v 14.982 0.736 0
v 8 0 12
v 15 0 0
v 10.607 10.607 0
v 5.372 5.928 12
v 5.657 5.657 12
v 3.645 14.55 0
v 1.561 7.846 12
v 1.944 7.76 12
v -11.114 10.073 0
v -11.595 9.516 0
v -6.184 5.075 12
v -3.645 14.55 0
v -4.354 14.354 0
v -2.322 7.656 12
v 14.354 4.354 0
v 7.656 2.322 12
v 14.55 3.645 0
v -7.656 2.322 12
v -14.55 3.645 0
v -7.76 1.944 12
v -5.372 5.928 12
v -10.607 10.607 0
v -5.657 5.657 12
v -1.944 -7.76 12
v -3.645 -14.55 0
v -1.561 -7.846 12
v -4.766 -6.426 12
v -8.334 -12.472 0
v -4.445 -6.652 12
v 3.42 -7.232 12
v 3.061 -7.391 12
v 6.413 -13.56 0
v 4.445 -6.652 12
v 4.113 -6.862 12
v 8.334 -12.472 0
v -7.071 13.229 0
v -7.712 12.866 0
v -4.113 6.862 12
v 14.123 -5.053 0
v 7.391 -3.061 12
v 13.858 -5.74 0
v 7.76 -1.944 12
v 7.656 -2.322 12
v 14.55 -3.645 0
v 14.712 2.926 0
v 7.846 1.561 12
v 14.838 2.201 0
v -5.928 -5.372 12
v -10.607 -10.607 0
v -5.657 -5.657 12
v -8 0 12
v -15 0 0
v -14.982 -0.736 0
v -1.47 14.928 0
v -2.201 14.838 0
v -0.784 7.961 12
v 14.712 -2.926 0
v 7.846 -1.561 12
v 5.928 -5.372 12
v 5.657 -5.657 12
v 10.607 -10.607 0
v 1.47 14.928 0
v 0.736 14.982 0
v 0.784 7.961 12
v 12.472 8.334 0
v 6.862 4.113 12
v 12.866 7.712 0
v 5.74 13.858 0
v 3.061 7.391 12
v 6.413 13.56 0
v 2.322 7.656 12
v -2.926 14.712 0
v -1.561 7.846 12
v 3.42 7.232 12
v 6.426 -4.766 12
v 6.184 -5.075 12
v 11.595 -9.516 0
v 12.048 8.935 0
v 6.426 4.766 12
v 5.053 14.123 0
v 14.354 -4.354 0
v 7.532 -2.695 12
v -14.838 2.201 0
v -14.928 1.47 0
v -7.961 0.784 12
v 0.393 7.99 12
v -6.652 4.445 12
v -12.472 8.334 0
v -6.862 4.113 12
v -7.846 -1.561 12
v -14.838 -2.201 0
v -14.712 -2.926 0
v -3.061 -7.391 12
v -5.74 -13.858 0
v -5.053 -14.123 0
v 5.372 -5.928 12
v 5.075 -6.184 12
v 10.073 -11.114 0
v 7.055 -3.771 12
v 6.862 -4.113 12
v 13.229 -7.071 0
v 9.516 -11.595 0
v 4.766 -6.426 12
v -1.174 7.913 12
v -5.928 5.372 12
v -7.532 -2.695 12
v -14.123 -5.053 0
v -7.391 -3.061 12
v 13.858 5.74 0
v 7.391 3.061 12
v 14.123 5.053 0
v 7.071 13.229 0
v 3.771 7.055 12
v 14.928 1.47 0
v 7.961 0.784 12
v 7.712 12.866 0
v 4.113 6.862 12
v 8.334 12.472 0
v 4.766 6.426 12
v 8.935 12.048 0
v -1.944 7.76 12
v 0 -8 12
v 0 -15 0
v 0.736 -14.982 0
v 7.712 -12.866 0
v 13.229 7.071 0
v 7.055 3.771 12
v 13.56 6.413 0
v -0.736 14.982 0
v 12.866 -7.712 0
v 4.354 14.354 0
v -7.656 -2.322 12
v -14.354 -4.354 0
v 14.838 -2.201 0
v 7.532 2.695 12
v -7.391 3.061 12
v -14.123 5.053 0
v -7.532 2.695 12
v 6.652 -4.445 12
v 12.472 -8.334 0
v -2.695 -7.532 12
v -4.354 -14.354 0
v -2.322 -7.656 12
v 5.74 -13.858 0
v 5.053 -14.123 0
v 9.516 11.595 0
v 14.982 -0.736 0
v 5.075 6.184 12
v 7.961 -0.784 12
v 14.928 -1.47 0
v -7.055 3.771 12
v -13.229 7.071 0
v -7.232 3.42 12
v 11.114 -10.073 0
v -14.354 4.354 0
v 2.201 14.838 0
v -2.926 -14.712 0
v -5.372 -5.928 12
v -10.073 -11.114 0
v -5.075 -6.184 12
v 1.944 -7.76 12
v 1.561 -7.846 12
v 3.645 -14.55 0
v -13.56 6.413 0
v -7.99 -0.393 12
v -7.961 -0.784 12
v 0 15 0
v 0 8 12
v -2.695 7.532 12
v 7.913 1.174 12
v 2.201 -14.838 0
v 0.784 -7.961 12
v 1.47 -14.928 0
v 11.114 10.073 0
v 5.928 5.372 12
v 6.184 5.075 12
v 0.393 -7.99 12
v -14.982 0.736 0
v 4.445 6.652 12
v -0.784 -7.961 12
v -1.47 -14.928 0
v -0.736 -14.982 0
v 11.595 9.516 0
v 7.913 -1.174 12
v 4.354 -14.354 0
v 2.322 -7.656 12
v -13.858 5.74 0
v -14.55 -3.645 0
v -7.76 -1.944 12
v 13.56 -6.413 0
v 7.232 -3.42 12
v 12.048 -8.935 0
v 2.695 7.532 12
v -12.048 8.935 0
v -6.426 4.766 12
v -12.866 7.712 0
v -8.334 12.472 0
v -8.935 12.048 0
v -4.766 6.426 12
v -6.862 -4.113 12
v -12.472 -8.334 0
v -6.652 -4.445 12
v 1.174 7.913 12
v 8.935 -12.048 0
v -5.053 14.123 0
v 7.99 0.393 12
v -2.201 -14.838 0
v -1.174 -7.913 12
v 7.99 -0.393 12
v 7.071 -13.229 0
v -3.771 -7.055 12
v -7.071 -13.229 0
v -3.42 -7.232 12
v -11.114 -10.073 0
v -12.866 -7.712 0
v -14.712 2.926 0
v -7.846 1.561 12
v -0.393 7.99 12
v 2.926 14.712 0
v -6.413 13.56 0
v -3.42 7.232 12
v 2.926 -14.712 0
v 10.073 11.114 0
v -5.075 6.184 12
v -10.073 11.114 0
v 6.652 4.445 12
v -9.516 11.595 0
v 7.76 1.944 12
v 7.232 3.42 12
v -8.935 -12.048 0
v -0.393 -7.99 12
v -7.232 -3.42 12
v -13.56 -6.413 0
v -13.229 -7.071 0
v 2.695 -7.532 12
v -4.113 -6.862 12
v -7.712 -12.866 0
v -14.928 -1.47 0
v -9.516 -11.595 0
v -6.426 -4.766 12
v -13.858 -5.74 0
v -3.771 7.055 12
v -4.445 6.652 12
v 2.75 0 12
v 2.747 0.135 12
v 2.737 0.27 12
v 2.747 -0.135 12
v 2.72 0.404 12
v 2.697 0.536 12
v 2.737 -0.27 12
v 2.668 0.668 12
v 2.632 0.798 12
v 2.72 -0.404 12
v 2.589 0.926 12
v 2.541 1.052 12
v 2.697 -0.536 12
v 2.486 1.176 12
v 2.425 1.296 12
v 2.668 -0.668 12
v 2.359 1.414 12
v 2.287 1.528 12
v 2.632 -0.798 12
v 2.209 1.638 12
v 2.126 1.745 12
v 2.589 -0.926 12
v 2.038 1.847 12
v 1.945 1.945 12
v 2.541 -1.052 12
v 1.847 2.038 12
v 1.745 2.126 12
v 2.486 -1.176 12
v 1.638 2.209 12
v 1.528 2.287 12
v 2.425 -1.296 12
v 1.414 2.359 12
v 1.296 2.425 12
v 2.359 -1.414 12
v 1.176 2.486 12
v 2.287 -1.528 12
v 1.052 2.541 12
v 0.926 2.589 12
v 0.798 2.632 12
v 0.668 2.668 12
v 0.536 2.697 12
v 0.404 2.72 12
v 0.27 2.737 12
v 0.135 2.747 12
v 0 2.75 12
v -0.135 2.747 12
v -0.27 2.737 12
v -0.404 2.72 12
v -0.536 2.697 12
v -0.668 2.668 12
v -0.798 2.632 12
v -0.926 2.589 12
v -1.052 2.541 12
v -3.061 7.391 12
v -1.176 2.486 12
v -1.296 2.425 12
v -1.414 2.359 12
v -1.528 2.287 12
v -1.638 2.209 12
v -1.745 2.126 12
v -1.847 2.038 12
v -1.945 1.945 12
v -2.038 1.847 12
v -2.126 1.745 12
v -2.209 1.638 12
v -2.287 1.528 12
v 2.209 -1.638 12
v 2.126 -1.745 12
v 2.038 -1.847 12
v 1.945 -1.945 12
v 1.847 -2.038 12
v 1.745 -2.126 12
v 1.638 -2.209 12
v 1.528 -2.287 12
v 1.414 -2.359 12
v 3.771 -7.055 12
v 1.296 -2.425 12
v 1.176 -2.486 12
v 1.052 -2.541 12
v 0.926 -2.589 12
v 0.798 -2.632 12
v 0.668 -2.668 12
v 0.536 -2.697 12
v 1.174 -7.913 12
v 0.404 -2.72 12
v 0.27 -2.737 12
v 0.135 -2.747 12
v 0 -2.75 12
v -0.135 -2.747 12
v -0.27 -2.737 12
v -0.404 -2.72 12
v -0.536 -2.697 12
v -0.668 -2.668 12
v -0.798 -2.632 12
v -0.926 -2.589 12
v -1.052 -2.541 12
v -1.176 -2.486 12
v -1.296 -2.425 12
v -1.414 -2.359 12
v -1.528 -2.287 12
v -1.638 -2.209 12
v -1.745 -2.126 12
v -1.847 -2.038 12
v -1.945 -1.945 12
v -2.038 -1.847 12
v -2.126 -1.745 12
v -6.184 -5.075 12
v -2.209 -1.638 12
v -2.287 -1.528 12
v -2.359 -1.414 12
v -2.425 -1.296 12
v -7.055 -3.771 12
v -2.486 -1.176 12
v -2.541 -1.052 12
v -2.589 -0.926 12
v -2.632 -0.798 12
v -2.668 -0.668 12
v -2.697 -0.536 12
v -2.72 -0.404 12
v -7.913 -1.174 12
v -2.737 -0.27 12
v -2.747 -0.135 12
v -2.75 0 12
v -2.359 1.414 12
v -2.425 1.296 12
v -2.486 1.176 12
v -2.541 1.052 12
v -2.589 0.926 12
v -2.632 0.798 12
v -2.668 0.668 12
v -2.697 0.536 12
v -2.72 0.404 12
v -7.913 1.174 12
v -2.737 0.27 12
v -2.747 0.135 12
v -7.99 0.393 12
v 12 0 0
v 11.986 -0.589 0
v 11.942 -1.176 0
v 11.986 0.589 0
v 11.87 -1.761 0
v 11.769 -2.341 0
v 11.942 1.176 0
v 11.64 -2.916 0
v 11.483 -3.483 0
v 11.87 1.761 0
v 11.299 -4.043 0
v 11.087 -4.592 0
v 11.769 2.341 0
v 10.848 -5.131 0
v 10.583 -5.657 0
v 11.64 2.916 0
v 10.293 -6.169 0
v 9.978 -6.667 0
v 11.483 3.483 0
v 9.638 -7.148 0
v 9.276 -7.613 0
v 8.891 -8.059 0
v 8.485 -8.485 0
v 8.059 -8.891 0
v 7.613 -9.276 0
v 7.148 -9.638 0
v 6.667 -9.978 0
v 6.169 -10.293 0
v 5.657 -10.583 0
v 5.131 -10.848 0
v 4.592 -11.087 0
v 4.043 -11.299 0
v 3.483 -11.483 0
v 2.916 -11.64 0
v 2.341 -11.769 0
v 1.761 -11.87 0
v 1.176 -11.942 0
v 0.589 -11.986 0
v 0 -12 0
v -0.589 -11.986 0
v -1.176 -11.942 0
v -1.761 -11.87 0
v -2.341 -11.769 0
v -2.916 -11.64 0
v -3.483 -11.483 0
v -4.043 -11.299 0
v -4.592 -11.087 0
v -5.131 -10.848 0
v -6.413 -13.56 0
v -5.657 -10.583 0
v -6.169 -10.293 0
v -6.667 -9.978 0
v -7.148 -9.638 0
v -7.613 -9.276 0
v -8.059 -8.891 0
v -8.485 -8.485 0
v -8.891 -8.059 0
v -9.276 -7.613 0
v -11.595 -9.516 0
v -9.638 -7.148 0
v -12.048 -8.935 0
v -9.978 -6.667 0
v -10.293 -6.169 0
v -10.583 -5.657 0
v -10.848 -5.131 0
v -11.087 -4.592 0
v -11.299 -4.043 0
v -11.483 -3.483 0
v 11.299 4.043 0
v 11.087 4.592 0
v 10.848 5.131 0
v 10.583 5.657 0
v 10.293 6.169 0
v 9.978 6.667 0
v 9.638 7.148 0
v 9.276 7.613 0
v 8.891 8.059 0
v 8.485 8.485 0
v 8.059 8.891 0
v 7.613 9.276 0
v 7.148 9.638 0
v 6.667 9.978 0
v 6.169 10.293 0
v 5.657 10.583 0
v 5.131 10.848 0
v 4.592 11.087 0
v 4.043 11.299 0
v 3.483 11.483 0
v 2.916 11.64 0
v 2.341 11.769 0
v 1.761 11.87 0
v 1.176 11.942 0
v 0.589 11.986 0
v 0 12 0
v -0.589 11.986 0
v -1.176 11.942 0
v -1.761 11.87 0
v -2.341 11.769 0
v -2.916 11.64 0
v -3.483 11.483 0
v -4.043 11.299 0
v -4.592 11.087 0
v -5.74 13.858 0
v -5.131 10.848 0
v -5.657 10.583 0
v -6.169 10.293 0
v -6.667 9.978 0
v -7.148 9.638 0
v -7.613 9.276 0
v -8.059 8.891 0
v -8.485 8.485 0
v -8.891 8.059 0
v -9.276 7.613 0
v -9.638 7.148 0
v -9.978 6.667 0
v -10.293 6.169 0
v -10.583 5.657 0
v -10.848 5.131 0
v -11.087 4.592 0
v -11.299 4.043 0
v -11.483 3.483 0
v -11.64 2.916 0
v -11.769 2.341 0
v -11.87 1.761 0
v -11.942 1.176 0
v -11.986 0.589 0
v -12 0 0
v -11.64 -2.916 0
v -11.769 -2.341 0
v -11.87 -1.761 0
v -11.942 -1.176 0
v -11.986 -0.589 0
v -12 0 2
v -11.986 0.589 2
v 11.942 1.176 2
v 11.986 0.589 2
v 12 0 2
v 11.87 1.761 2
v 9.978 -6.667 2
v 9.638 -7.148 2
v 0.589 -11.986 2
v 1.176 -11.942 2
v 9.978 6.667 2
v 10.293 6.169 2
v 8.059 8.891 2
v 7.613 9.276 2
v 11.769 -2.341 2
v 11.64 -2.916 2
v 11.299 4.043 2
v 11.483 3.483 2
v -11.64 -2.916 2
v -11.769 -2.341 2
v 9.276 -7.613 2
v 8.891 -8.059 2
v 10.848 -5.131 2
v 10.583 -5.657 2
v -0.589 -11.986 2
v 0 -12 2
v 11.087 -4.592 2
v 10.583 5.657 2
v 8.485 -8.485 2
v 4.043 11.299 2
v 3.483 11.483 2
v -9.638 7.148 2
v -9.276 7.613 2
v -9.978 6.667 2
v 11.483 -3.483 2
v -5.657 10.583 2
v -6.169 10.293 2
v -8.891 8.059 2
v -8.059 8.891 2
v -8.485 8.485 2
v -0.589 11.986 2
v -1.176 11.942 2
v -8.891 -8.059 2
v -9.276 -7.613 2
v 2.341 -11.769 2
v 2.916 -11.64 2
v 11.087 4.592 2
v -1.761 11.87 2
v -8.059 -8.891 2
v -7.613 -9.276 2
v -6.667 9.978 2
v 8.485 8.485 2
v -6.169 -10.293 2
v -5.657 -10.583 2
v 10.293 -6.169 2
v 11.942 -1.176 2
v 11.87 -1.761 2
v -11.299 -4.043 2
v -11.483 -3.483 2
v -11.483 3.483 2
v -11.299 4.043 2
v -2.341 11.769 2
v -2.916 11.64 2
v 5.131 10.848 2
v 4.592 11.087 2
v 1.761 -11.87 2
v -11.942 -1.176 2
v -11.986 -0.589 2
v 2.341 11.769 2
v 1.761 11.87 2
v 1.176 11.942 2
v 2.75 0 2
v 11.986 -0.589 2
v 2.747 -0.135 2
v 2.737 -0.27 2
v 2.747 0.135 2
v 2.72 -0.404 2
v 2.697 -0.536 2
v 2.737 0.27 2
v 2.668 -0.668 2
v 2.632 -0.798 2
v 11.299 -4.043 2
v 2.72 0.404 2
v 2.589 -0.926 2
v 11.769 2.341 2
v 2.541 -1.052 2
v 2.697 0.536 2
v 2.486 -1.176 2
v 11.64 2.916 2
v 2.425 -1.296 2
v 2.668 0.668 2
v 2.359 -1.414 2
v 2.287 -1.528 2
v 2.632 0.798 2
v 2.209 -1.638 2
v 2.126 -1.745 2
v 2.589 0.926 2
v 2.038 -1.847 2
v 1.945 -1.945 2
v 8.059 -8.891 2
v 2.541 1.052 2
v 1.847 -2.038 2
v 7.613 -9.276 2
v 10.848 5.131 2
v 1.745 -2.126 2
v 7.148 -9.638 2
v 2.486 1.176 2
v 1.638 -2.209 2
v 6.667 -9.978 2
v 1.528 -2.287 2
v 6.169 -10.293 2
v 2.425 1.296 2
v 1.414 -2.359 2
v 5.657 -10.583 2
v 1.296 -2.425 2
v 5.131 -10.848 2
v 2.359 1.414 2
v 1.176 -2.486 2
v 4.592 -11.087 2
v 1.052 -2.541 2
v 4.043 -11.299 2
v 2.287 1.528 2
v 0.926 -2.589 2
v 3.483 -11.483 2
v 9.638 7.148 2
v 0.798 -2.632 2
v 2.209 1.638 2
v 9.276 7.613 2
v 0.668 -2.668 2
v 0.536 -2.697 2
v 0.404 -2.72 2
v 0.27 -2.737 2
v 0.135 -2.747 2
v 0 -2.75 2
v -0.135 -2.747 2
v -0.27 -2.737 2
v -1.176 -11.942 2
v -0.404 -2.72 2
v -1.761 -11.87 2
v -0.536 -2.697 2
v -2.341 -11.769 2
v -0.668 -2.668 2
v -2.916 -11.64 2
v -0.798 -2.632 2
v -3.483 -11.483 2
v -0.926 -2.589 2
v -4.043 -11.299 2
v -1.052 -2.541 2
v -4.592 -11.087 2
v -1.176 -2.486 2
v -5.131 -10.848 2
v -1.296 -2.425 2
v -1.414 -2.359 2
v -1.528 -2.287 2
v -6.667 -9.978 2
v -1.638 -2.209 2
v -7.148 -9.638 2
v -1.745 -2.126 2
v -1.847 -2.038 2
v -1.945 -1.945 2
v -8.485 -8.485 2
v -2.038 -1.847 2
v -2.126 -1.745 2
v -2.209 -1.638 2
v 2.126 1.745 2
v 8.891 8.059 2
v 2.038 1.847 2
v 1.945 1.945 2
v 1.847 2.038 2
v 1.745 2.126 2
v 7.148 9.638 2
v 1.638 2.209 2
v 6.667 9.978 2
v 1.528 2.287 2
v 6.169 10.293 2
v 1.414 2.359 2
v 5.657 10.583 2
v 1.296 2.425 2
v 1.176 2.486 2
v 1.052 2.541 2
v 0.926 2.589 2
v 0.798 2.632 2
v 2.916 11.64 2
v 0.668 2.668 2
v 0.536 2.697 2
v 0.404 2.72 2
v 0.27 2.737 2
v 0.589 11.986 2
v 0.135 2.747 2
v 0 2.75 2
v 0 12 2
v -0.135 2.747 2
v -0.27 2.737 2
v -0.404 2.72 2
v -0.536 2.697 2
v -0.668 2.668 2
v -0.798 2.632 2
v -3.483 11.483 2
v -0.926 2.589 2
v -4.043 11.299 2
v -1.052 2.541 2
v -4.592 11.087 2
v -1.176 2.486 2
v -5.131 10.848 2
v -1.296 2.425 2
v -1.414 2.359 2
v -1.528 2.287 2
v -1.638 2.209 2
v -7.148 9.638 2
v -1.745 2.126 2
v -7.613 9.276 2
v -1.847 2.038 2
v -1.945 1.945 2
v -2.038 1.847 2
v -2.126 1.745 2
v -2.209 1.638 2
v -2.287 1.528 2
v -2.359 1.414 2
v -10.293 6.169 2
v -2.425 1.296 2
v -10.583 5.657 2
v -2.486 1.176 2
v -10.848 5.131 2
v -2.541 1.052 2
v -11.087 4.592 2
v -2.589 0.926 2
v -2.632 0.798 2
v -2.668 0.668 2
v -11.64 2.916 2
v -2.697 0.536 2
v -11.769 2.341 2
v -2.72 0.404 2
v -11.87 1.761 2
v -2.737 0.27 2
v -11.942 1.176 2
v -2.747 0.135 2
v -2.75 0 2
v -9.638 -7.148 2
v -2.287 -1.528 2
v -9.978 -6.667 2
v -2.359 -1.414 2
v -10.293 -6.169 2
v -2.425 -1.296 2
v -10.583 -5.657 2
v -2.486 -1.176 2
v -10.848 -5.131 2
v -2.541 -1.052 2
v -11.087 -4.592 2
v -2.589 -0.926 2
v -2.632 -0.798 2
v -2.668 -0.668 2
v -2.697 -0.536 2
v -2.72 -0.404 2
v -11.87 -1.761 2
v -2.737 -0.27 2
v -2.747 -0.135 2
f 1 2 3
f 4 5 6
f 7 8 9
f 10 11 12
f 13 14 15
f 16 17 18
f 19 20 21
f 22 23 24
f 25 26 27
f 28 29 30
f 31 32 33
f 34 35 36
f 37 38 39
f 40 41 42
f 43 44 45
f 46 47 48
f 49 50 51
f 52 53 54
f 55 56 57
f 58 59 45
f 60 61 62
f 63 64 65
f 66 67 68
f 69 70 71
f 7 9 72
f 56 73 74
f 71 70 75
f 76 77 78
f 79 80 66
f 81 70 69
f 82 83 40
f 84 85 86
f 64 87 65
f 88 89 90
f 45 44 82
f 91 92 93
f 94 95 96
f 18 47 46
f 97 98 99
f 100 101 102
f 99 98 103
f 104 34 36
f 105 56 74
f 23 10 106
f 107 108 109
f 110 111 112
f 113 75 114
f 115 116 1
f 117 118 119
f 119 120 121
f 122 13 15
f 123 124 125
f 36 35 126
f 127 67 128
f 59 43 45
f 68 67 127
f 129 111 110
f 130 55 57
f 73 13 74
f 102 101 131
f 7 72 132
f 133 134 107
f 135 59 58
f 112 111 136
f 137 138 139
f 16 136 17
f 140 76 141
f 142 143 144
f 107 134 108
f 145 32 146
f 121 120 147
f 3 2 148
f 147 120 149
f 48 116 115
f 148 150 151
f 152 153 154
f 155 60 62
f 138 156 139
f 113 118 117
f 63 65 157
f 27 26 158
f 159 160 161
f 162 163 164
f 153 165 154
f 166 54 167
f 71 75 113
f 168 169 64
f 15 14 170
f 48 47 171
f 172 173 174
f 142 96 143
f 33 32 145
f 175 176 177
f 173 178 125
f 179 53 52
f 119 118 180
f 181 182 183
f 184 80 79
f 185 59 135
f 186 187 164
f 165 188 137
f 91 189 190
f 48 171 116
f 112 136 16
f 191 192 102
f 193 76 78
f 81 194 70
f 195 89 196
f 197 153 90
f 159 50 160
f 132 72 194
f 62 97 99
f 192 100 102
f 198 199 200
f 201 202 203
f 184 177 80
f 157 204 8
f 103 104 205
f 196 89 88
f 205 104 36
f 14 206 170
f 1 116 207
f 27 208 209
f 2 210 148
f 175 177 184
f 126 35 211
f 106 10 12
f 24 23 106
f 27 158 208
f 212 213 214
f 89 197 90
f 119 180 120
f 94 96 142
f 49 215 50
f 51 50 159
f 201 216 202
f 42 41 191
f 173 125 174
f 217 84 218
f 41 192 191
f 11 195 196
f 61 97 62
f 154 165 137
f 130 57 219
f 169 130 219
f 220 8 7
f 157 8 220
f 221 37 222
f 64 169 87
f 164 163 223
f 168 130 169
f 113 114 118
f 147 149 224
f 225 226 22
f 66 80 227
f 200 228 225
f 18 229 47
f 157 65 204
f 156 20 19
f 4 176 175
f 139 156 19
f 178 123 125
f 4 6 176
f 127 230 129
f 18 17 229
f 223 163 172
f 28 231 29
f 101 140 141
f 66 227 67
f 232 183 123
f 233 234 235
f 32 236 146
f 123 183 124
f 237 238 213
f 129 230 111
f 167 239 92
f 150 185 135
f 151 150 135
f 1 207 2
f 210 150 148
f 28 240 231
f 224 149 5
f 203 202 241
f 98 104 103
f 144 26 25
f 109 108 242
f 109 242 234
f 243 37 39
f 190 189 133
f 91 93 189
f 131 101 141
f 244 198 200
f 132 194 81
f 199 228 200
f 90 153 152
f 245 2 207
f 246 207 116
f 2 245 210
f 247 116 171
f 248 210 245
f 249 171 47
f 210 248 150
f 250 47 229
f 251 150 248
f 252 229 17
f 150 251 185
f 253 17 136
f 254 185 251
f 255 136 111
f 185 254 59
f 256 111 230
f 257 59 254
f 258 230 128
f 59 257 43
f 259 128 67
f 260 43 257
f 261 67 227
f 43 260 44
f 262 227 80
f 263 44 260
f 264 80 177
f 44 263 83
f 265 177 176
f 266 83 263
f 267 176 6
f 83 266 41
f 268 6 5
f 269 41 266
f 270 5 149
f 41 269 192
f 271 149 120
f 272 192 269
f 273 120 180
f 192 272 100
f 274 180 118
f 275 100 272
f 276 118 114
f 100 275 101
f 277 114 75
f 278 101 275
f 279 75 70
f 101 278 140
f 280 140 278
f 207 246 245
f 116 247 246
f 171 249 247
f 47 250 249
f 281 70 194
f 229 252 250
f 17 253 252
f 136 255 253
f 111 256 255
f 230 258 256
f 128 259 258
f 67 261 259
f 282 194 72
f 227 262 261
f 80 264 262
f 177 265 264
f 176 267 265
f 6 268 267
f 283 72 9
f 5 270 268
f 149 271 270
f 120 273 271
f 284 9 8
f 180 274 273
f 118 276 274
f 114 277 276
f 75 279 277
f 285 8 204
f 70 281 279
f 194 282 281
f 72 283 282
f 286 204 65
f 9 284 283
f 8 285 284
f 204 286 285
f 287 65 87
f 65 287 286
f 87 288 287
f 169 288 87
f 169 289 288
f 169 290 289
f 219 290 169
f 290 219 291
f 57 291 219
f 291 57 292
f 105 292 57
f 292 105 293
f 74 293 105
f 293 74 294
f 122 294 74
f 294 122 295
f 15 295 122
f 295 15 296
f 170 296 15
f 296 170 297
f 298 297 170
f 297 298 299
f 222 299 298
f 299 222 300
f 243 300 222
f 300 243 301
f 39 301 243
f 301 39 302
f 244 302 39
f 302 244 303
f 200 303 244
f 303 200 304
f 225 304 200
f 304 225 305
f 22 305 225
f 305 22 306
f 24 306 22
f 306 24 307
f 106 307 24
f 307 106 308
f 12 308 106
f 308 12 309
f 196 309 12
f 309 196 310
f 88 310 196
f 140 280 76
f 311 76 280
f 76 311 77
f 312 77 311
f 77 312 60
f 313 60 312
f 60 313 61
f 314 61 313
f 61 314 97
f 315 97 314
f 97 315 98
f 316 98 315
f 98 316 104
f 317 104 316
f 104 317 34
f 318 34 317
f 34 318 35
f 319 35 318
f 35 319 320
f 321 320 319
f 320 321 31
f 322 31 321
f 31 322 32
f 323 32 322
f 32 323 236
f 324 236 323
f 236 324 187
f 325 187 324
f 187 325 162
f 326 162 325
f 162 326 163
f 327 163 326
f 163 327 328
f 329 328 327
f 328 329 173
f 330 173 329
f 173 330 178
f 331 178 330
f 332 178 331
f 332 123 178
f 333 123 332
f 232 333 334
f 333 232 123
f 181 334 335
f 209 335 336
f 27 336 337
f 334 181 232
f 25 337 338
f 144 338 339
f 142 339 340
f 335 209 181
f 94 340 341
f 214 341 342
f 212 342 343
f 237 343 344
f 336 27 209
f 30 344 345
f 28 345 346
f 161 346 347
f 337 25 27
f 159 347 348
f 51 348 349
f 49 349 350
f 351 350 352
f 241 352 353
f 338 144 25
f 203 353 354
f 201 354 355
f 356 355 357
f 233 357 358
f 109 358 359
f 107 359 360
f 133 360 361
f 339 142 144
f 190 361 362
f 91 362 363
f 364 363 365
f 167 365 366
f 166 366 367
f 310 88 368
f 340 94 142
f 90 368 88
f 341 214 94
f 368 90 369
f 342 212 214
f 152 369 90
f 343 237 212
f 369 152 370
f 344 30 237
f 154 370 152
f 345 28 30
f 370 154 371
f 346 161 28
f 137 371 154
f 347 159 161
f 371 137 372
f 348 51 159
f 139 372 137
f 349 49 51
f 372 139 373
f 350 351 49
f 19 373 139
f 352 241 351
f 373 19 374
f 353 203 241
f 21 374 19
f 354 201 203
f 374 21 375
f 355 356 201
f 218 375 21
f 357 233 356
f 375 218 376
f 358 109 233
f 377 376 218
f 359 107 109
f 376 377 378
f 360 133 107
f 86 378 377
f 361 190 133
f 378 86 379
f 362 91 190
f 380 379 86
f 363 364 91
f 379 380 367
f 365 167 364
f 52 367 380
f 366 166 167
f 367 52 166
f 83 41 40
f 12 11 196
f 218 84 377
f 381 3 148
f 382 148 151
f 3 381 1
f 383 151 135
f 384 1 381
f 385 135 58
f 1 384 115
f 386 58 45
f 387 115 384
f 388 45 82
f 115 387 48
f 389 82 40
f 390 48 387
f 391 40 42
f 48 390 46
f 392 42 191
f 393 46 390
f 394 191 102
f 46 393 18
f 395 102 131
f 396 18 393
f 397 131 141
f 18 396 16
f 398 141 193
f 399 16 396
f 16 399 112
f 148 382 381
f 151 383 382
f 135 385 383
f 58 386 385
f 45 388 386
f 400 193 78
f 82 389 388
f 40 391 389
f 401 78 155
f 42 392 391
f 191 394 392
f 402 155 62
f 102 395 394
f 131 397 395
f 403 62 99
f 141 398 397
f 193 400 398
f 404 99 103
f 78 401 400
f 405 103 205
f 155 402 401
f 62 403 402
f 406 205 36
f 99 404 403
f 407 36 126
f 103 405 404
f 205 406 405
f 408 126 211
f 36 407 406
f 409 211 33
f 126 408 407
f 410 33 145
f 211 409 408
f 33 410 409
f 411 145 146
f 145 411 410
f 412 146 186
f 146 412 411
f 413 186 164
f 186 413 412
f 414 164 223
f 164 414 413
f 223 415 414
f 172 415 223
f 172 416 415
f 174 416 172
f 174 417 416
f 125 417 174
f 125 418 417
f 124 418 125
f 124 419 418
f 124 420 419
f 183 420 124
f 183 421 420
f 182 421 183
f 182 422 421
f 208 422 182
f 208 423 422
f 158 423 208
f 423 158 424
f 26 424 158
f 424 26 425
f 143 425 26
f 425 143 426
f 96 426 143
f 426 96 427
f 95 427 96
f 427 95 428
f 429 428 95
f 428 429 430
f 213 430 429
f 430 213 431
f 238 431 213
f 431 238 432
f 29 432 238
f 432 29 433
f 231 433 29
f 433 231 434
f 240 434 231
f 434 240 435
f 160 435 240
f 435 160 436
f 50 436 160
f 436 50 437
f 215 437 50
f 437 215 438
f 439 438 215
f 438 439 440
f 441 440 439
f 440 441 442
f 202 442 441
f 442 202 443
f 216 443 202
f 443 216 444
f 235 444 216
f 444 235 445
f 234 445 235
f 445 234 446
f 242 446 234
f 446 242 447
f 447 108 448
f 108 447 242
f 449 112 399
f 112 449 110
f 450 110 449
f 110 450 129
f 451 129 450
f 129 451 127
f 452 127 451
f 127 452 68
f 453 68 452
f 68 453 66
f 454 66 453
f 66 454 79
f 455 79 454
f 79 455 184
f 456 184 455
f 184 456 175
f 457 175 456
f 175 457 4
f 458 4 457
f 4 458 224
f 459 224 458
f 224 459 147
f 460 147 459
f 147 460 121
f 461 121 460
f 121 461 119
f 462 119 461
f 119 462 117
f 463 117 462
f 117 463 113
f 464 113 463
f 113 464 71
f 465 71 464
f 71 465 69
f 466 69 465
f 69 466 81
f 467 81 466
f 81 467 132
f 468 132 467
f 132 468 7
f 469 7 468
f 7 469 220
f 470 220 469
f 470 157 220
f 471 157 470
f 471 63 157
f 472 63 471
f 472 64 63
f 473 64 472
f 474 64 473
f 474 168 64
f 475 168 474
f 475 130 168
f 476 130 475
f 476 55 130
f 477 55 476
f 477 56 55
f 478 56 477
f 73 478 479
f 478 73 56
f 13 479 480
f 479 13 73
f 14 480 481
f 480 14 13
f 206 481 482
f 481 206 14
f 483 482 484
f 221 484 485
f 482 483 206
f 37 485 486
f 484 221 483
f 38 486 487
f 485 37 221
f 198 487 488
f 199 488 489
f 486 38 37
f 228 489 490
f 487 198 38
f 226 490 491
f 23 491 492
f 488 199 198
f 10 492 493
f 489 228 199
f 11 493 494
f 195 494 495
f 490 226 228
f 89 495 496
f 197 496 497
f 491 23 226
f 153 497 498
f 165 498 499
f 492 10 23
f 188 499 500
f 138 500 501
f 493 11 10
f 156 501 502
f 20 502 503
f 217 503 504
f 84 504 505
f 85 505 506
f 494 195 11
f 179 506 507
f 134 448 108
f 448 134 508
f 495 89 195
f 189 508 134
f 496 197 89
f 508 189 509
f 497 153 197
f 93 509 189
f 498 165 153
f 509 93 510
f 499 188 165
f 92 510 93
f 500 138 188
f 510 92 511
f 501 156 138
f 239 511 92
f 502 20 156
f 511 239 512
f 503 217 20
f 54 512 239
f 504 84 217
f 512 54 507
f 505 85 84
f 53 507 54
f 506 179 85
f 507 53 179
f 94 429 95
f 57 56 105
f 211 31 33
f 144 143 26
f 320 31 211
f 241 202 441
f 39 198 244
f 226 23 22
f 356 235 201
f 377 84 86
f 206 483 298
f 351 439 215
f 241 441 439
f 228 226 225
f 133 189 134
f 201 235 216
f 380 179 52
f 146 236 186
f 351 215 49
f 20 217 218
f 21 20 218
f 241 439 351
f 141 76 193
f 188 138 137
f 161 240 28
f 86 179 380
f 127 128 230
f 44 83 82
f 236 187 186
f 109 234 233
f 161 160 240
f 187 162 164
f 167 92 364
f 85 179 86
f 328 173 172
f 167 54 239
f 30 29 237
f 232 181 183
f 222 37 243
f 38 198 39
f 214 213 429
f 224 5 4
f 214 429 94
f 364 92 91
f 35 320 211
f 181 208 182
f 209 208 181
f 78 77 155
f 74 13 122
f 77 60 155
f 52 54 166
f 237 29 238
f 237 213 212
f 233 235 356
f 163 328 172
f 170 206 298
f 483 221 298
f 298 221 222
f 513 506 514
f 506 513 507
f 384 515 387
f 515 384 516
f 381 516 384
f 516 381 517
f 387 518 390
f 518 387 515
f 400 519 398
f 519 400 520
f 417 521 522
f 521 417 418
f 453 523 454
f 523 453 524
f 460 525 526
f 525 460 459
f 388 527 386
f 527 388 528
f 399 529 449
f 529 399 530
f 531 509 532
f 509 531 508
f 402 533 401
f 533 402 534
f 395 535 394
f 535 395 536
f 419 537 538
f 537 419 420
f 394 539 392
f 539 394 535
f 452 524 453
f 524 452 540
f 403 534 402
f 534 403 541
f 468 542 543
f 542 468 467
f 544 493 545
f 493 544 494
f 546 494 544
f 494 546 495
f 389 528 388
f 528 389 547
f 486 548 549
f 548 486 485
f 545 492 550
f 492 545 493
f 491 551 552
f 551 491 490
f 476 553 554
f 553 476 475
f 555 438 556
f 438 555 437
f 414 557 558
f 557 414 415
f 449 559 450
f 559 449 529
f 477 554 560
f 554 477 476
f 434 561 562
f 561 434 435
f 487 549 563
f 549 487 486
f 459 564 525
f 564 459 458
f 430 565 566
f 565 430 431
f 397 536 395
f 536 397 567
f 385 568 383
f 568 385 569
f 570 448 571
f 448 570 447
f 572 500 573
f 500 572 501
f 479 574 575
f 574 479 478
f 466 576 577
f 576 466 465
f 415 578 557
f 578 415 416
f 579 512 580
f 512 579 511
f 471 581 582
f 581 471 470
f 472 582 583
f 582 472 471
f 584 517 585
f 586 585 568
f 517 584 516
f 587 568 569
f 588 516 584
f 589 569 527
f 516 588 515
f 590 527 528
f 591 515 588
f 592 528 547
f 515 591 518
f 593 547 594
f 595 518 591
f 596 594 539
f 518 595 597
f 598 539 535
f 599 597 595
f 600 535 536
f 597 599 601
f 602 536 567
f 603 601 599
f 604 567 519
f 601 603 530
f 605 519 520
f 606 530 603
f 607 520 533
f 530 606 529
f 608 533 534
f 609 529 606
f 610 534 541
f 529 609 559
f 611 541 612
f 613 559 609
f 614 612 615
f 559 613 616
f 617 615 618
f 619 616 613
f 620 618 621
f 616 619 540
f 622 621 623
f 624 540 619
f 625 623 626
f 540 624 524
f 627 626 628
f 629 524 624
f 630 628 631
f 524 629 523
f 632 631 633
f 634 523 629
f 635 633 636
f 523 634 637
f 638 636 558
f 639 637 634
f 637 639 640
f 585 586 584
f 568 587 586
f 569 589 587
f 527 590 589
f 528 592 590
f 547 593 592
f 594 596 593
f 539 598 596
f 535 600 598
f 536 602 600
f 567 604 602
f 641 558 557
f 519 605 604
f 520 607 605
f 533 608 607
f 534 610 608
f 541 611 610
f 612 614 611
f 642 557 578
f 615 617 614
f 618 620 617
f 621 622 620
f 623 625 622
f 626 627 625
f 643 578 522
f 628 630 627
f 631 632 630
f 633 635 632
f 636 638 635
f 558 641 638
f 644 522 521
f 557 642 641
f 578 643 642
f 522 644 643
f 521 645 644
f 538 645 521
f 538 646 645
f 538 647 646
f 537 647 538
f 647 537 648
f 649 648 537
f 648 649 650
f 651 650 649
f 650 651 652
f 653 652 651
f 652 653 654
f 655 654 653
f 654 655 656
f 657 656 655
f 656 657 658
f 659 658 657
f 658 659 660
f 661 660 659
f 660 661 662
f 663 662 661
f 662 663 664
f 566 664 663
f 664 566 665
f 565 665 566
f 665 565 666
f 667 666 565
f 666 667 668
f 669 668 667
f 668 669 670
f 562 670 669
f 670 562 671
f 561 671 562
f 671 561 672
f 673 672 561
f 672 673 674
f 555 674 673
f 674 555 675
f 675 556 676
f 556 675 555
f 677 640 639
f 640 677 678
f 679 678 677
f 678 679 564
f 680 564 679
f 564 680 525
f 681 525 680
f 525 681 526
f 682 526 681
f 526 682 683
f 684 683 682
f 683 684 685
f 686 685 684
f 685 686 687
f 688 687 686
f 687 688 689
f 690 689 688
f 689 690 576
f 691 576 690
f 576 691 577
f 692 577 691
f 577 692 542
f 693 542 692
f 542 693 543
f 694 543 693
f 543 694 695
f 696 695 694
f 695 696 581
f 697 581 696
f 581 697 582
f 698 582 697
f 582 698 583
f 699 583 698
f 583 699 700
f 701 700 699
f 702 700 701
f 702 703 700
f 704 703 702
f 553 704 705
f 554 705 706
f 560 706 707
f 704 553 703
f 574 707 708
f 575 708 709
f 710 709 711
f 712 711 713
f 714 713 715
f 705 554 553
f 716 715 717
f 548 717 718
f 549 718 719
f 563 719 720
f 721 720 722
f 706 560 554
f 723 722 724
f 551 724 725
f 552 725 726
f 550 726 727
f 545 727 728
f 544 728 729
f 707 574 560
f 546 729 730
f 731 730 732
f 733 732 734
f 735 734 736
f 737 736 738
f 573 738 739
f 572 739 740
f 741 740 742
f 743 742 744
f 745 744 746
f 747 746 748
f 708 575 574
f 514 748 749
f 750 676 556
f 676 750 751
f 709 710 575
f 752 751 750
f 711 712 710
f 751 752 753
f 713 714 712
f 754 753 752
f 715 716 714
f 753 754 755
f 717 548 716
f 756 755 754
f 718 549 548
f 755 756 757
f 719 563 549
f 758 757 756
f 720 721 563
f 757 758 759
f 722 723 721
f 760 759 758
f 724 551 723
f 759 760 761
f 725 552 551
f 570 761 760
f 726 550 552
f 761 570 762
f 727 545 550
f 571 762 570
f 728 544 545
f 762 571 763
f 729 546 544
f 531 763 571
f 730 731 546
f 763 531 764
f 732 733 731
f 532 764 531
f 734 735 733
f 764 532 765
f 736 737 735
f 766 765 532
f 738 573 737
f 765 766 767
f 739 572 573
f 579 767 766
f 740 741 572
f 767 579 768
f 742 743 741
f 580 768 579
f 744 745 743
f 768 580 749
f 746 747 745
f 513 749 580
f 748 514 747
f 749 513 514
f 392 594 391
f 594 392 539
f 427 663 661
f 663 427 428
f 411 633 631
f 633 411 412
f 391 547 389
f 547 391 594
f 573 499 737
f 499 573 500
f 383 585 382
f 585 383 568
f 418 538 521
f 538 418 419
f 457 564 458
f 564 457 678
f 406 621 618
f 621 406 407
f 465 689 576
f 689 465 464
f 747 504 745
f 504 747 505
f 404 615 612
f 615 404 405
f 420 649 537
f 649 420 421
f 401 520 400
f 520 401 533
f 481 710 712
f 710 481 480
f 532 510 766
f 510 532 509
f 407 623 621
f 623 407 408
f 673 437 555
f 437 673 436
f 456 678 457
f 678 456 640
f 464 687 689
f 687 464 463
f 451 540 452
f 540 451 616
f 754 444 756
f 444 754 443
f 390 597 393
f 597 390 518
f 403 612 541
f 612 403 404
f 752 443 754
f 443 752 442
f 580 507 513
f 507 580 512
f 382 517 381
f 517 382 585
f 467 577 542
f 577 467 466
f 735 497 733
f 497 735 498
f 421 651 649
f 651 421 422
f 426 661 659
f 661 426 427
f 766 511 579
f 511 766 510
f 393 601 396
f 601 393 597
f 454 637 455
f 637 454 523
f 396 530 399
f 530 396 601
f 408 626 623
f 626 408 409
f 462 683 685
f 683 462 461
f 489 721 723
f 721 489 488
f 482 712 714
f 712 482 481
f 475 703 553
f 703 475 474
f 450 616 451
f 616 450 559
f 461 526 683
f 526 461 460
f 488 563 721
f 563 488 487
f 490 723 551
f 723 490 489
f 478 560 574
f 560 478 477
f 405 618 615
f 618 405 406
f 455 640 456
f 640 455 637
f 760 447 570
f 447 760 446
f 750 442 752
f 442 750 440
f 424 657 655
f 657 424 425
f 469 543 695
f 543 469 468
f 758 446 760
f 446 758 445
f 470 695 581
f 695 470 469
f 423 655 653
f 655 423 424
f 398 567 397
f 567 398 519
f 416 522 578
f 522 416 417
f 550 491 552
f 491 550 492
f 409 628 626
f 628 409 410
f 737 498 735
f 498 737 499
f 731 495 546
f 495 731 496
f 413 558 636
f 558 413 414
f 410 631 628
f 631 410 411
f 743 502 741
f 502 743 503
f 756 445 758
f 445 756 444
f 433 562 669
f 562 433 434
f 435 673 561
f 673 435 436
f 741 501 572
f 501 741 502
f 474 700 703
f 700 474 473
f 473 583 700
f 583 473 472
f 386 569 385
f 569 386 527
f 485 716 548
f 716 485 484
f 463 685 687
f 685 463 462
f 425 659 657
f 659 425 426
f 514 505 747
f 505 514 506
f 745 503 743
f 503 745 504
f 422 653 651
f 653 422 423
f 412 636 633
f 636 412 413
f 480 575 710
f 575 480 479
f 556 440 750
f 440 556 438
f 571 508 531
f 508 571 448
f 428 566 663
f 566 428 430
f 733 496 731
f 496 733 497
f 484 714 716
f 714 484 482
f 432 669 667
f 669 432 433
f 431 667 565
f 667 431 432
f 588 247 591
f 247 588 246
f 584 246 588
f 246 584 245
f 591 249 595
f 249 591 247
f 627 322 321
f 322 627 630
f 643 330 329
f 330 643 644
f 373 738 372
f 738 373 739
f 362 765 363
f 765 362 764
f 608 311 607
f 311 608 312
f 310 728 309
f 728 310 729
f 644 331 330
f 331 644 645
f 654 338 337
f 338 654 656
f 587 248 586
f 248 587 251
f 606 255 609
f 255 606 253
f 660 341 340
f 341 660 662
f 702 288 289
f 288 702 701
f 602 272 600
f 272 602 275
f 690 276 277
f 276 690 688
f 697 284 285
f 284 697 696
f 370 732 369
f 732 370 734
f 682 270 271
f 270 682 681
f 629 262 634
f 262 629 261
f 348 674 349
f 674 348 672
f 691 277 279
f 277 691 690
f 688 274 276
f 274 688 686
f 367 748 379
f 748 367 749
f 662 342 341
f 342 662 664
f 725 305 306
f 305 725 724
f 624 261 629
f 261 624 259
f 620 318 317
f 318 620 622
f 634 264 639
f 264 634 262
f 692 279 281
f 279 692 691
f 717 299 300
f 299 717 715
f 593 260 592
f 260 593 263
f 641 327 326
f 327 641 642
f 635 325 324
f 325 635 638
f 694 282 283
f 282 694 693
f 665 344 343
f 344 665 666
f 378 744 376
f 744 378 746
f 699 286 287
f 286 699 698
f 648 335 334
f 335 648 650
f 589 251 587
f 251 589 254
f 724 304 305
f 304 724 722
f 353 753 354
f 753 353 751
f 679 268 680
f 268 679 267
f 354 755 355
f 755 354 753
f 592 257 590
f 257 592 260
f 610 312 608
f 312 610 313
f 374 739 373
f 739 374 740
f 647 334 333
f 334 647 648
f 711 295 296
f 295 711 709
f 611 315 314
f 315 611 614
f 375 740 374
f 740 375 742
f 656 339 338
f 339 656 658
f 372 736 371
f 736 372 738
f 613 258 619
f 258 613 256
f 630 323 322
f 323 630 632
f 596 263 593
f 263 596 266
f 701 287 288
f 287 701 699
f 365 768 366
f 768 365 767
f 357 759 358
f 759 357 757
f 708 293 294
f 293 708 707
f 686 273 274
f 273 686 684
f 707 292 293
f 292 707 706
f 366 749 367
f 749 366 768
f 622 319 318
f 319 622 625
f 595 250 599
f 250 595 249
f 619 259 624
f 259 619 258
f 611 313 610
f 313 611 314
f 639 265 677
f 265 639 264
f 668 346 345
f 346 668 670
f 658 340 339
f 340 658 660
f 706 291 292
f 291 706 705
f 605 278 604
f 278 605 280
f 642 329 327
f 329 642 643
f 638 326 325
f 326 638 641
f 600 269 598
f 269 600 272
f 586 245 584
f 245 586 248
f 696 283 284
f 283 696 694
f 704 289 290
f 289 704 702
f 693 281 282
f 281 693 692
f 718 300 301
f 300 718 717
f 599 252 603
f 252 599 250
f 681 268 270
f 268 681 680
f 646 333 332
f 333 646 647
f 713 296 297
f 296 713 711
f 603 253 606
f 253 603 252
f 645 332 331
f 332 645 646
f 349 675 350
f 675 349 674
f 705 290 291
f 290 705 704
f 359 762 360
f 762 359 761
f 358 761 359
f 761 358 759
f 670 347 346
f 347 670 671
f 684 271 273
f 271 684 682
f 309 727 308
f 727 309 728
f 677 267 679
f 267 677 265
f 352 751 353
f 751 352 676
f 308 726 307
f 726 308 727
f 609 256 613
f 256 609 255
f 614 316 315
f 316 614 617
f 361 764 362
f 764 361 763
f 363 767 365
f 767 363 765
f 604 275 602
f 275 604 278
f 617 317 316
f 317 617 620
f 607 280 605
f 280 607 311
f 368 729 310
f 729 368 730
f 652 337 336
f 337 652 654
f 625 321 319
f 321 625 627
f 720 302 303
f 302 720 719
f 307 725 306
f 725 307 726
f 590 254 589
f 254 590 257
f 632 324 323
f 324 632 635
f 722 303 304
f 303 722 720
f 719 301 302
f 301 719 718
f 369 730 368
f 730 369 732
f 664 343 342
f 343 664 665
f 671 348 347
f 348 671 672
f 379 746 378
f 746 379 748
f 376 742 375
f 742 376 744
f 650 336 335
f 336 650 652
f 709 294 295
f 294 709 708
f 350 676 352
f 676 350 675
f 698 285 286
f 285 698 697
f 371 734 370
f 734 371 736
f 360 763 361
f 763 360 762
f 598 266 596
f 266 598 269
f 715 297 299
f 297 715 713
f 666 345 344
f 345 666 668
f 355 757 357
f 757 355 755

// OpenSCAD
// Anti-vibration foot for benchtop instrument
// Print orientation: wide base on bed (z = 0), narrowing upward

$fn = 128;

// ---- Dimensions (mm) ----
base_d     = 30;    // frustum diameter at bottom (z = 0)
top_d      = 16;    // frustum diameter at flat top
height     = 12;    // overall height of frustum

recess_d   = 24;    // rubber pad recess diameter (bottom face)
recess_h   = 2;     // rubber pad recess depth

hole_d     = 5.5;   // through screw hole diameter

eps        = 0.5;   // overshoot for clean boolean cuts

// ---- Model ----
difference() {
    // Main frustum body
    cylinder(h = height, d1 = base_d, d2 = top_d);

    // Bottom recess for rubber pad
    translate([0, 0, -eps])
        cylinder(h = recess_h + eps, d = recess_d);

    // Central through hole for screw
    translate([0, 0, -eps])
        cylinder(h = height + 2 * eps, d = hole_d);
}
